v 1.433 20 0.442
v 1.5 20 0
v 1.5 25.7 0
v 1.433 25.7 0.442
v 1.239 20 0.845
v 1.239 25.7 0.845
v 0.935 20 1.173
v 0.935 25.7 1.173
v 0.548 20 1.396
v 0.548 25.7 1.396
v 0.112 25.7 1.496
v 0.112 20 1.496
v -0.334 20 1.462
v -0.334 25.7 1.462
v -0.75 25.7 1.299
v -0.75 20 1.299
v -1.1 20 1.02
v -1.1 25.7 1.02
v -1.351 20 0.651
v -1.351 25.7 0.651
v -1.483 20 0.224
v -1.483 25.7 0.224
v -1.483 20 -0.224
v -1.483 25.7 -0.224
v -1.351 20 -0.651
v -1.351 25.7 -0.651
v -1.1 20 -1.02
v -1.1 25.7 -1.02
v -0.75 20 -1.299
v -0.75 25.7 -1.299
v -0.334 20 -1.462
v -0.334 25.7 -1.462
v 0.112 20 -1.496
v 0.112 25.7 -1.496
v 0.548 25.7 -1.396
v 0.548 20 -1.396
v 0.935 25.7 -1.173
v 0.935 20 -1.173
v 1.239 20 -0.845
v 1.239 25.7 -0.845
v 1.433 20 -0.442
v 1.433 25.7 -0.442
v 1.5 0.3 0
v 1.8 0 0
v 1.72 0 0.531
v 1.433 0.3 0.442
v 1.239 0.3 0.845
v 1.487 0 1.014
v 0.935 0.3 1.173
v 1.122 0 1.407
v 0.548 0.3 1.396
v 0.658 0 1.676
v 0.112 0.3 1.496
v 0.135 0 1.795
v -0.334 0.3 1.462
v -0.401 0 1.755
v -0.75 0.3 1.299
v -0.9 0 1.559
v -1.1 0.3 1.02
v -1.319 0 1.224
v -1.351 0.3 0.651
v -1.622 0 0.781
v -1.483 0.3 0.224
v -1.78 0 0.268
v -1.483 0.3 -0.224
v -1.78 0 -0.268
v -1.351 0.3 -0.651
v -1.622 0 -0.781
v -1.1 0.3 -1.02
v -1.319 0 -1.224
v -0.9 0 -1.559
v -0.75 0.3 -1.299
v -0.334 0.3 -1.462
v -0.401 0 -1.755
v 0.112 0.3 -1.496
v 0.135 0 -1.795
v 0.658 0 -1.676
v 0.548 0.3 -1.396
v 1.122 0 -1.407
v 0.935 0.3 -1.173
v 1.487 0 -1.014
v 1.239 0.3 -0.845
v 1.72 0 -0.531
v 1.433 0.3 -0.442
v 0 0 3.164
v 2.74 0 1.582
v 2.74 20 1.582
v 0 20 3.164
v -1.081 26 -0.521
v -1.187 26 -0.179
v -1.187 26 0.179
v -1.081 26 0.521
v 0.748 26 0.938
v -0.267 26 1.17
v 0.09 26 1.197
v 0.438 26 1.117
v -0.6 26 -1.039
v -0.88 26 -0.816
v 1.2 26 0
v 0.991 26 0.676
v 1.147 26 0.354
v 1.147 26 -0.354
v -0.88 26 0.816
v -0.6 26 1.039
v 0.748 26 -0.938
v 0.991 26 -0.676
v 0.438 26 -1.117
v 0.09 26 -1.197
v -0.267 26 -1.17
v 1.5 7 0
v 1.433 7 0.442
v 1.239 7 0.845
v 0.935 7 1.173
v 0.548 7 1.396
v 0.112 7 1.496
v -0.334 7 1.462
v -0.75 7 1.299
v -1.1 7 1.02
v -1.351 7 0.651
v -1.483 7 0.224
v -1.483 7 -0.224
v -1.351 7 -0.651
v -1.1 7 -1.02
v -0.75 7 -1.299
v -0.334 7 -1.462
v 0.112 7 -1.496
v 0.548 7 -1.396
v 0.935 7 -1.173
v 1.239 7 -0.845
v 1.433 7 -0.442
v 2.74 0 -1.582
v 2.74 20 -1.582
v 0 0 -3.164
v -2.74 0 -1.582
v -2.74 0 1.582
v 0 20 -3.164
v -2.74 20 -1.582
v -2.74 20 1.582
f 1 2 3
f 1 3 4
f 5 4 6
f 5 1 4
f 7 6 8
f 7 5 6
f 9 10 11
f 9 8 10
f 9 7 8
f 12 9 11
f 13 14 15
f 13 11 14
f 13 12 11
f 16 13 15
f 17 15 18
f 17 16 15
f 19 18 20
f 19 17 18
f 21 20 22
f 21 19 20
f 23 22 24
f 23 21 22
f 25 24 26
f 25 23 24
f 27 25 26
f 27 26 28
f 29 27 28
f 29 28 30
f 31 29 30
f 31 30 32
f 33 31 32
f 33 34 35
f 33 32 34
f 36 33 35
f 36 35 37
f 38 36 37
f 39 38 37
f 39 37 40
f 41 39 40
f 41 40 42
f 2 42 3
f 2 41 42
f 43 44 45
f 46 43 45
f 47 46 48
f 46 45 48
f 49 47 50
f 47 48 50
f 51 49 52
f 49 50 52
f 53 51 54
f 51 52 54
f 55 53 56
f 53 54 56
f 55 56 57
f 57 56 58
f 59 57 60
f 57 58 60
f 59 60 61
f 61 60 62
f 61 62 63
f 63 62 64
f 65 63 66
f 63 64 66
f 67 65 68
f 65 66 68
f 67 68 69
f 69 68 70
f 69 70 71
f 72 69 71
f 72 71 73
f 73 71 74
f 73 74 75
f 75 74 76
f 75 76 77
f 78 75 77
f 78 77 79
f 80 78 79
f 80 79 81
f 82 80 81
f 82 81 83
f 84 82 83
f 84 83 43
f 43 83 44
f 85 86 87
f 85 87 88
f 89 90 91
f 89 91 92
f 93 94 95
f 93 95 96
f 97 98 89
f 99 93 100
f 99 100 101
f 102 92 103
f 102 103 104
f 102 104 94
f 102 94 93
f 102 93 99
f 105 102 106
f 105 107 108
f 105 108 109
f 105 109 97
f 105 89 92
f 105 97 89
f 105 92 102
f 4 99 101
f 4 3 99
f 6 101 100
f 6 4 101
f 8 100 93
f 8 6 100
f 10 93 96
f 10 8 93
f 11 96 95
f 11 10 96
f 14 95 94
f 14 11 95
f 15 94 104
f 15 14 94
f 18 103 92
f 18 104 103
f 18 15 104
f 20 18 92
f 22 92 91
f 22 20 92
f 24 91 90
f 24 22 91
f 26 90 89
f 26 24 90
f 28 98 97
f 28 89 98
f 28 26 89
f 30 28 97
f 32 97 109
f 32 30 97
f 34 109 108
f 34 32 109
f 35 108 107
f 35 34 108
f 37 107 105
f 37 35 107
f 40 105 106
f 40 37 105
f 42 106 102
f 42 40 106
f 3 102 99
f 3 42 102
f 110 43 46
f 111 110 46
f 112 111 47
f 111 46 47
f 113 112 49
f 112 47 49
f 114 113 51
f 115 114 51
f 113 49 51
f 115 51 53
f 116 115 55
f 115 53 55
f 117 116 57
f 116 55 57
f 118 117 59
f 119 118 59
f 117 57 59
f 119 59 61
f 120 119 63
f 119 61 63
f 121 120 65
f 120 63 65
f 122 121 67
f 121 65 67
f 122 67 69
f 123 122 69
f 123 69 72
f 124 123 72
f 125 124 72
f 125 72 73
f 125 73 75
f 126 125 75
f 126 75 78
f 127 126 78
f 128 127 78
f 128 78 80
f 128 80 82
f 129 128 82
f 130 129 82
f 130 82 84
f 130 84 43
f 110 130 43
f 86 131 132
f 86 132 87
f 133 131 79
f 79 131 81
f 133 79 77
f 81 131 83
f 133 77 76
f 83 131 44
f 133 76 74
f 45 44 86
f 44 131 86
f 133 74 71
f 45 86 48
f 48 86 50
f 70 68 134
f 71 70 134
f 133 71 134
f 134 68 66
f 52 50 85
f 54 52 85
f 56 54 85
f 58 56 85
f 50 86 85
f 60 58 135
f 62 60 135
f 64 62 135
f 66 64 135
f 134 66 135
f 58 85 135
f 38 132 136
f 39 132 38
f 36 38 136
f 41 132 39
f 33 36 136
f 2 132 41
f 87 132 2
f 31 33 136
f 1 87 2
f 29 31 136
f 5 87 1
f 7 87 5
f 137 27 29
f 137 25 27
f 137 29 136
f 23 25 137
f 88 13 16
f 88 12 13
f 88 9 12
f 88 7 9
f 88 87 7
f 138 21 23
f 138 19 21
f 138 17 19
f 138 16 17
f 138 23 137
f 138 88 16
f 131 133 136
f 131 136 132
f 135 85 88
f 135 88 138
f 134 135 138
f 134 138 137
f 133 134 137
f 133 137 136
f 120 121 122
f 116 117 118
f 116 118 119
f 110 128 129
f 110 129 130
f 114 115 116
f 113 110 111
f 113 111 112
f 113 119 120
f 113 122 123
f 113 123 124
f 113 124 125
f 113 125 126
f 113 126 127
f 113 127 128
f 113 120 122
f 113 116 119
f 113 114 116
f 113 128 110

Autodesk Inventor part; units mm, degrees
ref_plane "YZ Plane" through (0, 0, 0) normal (1, 0, 0) x (0, 1, 0)
ref_plane "XZ Plane" through (0, 0, 0) normal (0, 1, 0) x (-1, 0, 0)
ref_plane "XY Plane" through (0, 0, 0) normal (0, 0, 1) x (1, 0, 0)
sketch "Sketch1" plane through (0, 0, 0) normal (0, 1, 0) x (-1, 0, 0)
  line L0 (0, 3.1639) -> (2.74, 1.5819)
  line L1 (2.74, 1.5819) -> (2.74, -1.5819)
  line L2 (2.74, -1.5819) -> (0, -3.1639)
  line L3 (0, -3.1639) -> (-2.74, -1.5819)
  line L4 (-2.74, -1.5819) -> (-2.74, 1.5819)
  line L5 (-2.74, 1.5819) -> (0, 3.1639)
  point P0 (0, 0)
  point P1 (0, 0)
  dimension "d0" = 5.48
extrude "Extrusion1" add sketch "Sketch1" along normal blind 20
sketch "Sketch2" plane through (0, 20, 0) normal (0, 1, 0) x (1, 0, 0)
  circle A0 centre (0, 0) radius 1.5
  dimension "d3" = 3
extrude "Extrusion2" add sketch "Sketch2" along normal blind 6
thread "Thread1" size "M3x0.5" class "6g" standard "ANSI Metric M Profile" full length
chamfer "Chamfer1" distance 0.3 angle 45 1 edges at (-1.5, 26, 0)
sketch "Sketch3" plane through (0, 0, 0) normal (0, -1, 0) x (1, 0, 0)
  circle A0 centre (0, 0) radius 1.5
  dimension "d11" = 3
extrude "Extrusion3" cut sketch "Sketch3" against normal blind 7
thread "Thread2" size "M3x0.5" class "6H" standard "ANSI Metric M Profile" full length
chamfer "Chamfer2" distance 0.3 angle 45 1 edges at (-1.5, 0, 0)
properties part number "20mm_support"
